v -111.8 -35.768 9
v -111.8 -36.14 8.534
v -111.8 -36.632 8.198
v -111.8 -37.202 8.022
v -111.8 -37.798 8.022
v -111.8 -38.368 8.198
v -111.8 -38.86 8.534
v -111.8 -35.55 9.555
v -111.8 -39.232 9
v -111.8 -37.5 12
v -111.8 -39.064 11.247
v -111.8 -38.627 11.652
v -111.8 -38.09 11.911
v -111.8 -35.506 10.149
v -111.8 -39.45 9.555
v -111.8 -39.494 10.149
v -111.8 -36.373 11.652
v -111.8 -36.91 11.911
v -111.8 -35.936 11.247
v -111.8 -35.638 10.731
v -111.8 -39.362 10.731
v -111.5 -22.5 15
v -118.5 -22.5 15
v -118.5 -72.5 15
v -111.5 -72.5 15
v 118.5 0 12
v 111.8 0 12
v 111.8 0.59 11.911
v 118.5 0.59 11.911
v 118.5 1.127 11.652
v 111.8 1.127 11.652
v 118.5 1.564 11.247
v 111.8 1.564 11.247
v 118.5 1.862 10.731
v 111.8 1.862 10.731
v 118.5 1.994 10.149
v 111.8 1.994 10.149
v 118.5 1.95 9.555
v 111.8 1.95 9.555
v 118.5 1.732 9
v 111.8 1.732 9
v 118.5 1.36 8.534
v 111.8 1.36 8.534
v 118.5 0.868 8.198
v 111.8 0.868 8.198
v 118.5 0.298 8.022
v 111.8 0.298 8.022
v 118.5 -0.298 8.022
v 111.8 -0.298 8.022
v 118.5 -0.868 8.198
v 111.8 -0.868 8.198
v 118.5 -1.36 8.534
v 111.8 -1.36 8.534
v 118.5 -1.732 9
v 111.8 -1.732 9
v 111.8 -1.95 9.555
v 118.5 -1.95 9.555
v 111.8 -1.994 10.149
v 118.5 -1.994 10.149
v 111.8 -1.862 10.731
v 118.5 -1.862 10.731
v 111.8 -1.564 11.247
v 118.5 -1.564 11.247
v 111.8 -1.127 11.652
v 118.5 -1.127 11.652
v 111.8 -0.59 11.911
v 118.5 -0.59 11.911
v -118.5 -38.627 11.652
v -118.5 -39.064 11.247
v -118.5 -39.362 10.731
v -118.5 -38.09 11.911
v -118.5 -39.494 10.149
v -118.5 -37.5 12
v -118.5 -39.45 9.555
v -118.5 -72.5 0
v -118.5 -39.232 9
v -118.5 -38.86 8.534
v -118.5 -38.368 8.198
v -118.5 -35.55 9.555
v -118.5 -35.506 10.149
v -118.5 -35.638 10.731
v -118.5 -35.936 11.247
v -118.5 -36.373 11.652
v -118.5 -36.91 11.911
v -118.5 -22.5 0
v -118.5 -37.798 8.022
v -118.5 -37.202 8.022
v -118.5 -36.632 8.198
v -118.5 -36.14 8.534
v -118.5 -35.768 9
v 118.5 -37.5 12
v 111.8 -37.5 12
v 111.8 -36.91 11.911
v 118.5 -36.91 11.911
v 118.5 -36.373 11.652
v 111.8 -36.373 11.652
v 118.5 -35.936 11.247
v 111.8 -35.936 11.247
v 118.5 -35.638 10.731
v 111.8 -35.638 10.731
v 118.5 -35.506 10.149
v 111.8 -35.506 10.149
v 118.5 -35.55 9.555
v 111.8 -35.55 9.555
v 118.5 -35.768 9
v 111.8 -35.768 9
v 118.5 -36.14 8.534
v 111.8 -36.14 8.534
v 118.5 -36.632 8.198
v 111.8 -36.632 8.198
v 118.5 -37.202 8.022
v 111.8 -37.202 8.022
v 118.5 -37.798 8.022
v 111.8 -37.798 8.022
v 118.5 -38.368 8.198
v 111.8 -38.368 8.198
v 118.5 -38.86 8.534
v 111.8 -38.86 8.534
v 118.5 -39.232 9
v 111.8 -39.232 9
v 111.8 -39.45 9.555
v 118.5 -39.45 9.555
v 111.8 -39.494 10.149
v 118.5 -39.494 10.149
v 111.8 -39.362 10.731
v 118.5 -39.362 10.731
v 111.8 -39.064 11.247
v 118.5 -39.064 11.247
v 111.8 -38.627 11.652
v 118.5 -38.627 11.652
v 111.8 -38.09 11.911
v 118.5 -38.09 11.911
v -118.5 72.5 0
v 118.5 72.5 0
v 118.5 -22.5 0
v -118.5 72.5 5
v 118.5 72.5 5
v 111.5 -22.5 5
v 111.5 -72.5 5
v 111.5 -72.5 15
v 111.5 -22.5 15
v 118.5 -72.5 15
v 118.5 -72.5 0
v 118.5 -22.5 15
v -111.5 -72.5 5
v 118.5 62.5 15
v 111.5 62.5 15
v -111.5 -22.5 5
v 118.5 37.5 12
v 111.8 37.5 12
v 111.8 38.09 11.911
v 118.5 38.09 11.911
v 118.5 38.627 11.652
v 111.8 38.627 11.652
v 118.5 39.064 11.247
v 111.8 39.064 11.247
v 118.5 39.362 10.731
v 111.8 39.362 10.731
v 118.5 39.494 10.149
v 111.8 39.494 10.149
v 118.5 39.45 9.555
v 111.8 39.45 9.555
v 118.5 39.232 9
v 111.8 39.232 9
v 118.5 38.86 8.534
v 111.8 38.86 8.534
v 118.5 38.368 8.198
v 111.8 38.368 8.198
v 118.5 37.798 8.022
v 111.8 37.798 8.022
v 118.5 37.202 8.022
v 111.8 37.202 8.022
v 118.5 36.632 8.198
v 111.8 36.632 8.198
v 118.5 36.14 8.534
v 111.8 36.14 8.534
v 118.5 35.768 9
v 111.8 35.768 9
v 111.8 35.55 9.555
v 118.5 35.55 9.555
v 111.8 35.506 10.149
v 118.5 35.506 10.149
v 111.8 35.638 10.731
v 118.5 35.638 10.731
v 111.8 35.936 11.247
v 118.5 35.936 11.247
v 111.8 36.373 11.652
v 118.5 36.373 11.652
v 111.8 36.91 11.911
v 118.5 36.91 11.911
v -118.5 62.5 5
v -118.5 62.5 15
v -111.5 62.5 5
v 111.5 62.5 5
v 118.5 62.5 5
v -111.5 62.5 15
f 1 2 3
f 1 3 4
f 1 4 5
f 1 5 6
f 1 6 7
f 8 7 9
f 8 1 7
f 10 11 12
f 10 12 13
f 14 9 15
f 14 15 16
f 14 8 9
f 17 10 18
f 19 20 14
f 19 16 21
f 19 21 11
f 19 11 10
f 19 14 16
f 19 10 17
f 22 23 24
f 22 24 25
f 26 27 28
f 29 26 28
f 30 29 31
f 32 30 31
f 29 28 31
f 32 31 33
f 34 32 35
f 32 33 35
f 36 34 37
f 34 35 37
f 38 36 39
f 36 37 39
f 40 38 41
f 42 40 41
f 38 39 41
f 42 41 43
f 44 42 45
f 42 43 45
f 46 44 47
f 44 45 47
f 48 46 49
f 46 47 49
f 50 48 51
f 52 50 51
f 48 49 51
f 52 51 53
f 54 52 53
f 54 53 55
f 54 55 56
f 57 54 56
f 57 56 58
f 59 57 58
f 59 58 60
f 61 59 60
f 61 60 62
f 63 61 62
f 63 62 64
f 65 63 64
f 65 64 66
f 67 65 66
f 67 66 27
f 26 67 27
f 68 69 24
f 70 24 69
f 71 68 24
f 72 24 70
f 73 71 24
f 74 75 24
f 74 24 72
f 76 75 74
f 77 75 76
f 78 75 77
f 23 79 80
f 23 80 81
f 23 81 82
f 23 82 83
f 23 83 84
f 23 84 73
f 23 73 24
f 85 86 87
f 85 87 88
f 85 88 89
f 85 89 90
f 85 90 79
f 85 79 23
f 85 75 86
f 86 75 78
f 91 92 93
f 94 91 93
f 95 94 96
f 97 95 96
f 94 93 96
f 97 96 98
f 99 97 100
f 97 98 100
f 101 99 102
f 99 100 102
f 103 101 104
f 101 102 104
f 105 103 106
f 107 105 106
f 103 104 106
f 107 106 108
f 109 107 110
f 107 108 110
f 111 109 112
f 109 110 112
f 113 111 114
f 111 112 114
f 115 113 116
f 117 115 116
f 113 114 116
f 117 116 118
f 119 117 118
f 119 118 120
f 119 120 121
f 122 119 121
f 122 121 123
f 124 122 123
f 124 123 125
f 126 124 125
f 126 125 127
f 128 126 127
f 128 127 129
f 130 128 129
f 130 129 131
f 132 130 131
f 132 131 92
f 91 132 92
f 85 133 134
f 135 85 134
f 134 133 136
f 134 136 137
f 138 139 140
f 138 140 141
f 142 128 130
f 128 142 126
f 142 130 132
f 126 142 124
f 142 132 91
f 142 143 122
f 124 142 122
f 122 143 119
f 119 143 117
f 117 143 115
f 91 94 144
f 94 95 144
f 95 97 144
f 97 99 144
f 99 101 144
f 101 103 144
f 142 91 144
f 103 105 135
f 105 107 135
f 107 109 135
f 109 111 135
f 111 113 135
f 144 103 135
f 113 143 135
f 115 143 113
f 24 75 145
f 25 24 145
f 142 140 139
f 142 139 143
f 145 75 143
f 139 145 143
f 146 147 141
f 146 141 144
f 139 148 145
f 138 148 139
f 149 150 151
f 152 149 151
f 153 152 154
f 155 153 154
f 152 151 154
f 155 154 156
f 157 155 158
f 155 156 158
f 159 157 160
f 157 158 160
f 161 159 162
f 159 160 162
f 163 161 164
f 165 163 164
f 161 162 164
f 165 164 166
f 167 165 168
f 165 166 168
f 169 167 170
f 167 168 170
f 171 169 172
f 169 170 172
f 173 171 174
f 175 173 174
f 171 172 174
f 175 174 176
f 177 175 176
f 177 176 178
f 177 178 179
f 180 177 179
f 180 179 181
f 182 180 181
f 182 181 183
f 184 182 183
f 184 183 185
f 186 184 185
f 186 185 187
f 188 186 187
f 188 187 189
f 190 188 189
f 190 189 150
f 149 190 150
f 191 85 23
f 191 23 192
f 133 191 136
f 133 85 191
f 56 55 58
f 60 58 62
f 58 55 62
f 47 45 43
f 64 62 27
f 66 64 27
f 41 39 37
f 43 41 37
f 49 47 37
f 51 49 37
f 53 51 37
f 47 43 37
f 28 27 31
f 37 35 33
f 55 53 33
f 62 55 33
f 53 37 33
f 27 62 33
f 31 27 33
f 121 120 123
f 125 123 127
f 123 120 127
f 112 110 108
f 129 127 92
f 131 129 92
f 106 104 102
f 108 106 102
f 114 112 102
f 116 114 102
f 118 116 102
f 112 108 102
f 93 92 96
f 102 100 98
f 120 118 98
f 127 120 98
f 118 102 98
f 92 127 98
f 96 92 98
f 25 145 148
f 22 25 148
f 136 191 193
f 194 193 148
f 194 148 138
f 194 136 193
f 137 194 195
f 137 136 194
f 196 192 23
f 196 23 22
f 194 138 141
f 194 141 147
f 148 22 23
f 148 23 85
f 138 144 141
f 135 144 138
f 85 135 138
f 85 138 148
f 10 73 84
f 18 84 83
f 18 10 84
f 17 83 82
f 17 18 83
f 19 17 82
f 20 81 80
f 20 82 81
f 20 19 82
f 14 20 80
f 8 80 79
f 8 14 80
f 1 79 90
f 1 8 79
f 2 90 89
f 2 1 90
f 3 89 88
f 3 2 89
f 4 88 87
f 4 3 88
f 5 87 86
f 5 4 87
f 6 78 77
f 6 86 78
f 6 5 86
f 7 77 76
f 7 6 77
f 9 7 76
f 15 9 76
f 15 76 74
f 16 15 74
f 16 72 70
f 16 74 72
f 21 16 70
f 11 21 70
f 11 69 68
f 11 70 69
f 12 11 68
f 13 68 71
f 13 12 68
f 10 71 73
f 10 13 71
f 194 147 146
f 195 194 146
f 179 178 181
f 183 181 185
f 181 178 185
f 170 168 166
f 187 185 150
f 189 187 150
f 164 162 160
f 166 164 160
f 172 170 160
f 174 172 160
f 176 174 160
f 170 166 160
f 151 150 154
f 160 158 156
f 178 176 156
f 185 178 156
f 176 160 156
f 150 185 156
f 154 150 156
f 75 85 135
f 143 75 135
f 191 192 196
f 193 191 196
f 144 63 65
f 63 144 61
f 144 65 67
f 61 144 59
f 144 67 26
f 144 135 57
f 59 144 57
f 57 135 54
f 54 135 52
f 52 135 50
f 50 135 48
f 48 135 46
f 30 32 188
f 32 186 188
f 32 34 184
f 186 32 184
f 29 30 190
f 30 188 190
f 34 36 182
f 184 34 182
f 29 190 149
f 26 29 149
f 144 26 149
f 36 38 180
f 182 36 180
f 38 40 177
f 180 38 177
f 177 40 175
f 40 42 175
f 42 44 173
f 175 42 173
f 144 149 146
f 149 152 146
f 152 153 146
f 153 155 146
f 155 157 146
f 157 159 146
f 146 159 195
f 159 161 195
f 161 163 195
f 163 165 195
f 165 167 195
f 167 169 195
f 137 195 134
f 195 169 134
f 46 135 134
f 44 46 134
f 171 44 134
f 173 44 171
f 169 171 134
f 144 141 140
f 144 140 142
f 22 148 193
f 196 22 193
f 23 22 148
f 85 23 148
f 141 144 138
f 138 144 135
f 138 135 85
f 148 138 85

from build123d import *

# Parameters (mm, degrees)
SZKIC1_W                    = 237
SZKIC1_H                    = 145
DODANIE_WYCI_GNI_CIE1_DEPTH = 5
SZKIC2_W                    = 7
SZKIC2_H                    = 135
DODANIE_WYCI_GNI_CIE2_DEPTH = 10
OTW_R_4_0_4_1_D             = 4
OTW_R_4_0_4_1_DEPTH         = 6.7


with BuildPart() as part:
    # Szkic1 → Dodanie-wyciągnięcie1 (new body)
    with BuildSketch(Plane.XY):
        Rectangle(SZKIC1_W, SZKIC1_H)
    extrude(amount=DODANIE_WYCI_GNI_CIE1_DEPTH)

    # Szkic2 → Dodanie-wyciągnięcie2 (add)
    with BuildSketch(Plane.XY.offset(5)):
        with Locations((115, -5)):
            Rectangle(SZKIC2_W, SZKIC2_H)
        with Locations((-115, -5)):
            Rectangle(SZKIC2_W, SZKIC2_H)
    extrude(amount=DODANIE_WYCI_GNI_CIE2_DEPTH)

    # Otwór Ø4.0 (4)1
    with Locations(Plane(origin=(118.5, 0, 0), x_dir=(0, 0, -1), z_dir=(1, 0, 0))):
        with Locations((-10, -37.5), (-10, 37.5), (-10, 0)):
            otw_r_4_0_4_1 = Hole(OTW_R_4_0_4_1_D / 2, depth=OTW_R_4_0_4_1_DEPTH)


with BuildPart() as body_2:
    # Podziel1: the piece on the far side of the plane
    add(part.part)
    split(bisect_by=Plane(origin=(0, -22.5, 0), x_dir=(0, 0, -1), z_dir=(0, -1, 0)), keep=Keep.BOTTOM)


with BuildPart() as part_1:
    add(part.part)

    # Podziel1
    split(bisect_by=Plane(origin=(0, -22.5, 0), x_dir=(0, 0, -1), z_dir=(0, -1, 0)), keep=Keep.TOP)

    # Lustro1: Otwór Ø4.0 (4)1 across plane
    add(otw_r_4_0_4_1.mirror(Plane.ZY), mode=Mode.SUBTRACT)


solid = Compound([body_2.part, part_1.part])
